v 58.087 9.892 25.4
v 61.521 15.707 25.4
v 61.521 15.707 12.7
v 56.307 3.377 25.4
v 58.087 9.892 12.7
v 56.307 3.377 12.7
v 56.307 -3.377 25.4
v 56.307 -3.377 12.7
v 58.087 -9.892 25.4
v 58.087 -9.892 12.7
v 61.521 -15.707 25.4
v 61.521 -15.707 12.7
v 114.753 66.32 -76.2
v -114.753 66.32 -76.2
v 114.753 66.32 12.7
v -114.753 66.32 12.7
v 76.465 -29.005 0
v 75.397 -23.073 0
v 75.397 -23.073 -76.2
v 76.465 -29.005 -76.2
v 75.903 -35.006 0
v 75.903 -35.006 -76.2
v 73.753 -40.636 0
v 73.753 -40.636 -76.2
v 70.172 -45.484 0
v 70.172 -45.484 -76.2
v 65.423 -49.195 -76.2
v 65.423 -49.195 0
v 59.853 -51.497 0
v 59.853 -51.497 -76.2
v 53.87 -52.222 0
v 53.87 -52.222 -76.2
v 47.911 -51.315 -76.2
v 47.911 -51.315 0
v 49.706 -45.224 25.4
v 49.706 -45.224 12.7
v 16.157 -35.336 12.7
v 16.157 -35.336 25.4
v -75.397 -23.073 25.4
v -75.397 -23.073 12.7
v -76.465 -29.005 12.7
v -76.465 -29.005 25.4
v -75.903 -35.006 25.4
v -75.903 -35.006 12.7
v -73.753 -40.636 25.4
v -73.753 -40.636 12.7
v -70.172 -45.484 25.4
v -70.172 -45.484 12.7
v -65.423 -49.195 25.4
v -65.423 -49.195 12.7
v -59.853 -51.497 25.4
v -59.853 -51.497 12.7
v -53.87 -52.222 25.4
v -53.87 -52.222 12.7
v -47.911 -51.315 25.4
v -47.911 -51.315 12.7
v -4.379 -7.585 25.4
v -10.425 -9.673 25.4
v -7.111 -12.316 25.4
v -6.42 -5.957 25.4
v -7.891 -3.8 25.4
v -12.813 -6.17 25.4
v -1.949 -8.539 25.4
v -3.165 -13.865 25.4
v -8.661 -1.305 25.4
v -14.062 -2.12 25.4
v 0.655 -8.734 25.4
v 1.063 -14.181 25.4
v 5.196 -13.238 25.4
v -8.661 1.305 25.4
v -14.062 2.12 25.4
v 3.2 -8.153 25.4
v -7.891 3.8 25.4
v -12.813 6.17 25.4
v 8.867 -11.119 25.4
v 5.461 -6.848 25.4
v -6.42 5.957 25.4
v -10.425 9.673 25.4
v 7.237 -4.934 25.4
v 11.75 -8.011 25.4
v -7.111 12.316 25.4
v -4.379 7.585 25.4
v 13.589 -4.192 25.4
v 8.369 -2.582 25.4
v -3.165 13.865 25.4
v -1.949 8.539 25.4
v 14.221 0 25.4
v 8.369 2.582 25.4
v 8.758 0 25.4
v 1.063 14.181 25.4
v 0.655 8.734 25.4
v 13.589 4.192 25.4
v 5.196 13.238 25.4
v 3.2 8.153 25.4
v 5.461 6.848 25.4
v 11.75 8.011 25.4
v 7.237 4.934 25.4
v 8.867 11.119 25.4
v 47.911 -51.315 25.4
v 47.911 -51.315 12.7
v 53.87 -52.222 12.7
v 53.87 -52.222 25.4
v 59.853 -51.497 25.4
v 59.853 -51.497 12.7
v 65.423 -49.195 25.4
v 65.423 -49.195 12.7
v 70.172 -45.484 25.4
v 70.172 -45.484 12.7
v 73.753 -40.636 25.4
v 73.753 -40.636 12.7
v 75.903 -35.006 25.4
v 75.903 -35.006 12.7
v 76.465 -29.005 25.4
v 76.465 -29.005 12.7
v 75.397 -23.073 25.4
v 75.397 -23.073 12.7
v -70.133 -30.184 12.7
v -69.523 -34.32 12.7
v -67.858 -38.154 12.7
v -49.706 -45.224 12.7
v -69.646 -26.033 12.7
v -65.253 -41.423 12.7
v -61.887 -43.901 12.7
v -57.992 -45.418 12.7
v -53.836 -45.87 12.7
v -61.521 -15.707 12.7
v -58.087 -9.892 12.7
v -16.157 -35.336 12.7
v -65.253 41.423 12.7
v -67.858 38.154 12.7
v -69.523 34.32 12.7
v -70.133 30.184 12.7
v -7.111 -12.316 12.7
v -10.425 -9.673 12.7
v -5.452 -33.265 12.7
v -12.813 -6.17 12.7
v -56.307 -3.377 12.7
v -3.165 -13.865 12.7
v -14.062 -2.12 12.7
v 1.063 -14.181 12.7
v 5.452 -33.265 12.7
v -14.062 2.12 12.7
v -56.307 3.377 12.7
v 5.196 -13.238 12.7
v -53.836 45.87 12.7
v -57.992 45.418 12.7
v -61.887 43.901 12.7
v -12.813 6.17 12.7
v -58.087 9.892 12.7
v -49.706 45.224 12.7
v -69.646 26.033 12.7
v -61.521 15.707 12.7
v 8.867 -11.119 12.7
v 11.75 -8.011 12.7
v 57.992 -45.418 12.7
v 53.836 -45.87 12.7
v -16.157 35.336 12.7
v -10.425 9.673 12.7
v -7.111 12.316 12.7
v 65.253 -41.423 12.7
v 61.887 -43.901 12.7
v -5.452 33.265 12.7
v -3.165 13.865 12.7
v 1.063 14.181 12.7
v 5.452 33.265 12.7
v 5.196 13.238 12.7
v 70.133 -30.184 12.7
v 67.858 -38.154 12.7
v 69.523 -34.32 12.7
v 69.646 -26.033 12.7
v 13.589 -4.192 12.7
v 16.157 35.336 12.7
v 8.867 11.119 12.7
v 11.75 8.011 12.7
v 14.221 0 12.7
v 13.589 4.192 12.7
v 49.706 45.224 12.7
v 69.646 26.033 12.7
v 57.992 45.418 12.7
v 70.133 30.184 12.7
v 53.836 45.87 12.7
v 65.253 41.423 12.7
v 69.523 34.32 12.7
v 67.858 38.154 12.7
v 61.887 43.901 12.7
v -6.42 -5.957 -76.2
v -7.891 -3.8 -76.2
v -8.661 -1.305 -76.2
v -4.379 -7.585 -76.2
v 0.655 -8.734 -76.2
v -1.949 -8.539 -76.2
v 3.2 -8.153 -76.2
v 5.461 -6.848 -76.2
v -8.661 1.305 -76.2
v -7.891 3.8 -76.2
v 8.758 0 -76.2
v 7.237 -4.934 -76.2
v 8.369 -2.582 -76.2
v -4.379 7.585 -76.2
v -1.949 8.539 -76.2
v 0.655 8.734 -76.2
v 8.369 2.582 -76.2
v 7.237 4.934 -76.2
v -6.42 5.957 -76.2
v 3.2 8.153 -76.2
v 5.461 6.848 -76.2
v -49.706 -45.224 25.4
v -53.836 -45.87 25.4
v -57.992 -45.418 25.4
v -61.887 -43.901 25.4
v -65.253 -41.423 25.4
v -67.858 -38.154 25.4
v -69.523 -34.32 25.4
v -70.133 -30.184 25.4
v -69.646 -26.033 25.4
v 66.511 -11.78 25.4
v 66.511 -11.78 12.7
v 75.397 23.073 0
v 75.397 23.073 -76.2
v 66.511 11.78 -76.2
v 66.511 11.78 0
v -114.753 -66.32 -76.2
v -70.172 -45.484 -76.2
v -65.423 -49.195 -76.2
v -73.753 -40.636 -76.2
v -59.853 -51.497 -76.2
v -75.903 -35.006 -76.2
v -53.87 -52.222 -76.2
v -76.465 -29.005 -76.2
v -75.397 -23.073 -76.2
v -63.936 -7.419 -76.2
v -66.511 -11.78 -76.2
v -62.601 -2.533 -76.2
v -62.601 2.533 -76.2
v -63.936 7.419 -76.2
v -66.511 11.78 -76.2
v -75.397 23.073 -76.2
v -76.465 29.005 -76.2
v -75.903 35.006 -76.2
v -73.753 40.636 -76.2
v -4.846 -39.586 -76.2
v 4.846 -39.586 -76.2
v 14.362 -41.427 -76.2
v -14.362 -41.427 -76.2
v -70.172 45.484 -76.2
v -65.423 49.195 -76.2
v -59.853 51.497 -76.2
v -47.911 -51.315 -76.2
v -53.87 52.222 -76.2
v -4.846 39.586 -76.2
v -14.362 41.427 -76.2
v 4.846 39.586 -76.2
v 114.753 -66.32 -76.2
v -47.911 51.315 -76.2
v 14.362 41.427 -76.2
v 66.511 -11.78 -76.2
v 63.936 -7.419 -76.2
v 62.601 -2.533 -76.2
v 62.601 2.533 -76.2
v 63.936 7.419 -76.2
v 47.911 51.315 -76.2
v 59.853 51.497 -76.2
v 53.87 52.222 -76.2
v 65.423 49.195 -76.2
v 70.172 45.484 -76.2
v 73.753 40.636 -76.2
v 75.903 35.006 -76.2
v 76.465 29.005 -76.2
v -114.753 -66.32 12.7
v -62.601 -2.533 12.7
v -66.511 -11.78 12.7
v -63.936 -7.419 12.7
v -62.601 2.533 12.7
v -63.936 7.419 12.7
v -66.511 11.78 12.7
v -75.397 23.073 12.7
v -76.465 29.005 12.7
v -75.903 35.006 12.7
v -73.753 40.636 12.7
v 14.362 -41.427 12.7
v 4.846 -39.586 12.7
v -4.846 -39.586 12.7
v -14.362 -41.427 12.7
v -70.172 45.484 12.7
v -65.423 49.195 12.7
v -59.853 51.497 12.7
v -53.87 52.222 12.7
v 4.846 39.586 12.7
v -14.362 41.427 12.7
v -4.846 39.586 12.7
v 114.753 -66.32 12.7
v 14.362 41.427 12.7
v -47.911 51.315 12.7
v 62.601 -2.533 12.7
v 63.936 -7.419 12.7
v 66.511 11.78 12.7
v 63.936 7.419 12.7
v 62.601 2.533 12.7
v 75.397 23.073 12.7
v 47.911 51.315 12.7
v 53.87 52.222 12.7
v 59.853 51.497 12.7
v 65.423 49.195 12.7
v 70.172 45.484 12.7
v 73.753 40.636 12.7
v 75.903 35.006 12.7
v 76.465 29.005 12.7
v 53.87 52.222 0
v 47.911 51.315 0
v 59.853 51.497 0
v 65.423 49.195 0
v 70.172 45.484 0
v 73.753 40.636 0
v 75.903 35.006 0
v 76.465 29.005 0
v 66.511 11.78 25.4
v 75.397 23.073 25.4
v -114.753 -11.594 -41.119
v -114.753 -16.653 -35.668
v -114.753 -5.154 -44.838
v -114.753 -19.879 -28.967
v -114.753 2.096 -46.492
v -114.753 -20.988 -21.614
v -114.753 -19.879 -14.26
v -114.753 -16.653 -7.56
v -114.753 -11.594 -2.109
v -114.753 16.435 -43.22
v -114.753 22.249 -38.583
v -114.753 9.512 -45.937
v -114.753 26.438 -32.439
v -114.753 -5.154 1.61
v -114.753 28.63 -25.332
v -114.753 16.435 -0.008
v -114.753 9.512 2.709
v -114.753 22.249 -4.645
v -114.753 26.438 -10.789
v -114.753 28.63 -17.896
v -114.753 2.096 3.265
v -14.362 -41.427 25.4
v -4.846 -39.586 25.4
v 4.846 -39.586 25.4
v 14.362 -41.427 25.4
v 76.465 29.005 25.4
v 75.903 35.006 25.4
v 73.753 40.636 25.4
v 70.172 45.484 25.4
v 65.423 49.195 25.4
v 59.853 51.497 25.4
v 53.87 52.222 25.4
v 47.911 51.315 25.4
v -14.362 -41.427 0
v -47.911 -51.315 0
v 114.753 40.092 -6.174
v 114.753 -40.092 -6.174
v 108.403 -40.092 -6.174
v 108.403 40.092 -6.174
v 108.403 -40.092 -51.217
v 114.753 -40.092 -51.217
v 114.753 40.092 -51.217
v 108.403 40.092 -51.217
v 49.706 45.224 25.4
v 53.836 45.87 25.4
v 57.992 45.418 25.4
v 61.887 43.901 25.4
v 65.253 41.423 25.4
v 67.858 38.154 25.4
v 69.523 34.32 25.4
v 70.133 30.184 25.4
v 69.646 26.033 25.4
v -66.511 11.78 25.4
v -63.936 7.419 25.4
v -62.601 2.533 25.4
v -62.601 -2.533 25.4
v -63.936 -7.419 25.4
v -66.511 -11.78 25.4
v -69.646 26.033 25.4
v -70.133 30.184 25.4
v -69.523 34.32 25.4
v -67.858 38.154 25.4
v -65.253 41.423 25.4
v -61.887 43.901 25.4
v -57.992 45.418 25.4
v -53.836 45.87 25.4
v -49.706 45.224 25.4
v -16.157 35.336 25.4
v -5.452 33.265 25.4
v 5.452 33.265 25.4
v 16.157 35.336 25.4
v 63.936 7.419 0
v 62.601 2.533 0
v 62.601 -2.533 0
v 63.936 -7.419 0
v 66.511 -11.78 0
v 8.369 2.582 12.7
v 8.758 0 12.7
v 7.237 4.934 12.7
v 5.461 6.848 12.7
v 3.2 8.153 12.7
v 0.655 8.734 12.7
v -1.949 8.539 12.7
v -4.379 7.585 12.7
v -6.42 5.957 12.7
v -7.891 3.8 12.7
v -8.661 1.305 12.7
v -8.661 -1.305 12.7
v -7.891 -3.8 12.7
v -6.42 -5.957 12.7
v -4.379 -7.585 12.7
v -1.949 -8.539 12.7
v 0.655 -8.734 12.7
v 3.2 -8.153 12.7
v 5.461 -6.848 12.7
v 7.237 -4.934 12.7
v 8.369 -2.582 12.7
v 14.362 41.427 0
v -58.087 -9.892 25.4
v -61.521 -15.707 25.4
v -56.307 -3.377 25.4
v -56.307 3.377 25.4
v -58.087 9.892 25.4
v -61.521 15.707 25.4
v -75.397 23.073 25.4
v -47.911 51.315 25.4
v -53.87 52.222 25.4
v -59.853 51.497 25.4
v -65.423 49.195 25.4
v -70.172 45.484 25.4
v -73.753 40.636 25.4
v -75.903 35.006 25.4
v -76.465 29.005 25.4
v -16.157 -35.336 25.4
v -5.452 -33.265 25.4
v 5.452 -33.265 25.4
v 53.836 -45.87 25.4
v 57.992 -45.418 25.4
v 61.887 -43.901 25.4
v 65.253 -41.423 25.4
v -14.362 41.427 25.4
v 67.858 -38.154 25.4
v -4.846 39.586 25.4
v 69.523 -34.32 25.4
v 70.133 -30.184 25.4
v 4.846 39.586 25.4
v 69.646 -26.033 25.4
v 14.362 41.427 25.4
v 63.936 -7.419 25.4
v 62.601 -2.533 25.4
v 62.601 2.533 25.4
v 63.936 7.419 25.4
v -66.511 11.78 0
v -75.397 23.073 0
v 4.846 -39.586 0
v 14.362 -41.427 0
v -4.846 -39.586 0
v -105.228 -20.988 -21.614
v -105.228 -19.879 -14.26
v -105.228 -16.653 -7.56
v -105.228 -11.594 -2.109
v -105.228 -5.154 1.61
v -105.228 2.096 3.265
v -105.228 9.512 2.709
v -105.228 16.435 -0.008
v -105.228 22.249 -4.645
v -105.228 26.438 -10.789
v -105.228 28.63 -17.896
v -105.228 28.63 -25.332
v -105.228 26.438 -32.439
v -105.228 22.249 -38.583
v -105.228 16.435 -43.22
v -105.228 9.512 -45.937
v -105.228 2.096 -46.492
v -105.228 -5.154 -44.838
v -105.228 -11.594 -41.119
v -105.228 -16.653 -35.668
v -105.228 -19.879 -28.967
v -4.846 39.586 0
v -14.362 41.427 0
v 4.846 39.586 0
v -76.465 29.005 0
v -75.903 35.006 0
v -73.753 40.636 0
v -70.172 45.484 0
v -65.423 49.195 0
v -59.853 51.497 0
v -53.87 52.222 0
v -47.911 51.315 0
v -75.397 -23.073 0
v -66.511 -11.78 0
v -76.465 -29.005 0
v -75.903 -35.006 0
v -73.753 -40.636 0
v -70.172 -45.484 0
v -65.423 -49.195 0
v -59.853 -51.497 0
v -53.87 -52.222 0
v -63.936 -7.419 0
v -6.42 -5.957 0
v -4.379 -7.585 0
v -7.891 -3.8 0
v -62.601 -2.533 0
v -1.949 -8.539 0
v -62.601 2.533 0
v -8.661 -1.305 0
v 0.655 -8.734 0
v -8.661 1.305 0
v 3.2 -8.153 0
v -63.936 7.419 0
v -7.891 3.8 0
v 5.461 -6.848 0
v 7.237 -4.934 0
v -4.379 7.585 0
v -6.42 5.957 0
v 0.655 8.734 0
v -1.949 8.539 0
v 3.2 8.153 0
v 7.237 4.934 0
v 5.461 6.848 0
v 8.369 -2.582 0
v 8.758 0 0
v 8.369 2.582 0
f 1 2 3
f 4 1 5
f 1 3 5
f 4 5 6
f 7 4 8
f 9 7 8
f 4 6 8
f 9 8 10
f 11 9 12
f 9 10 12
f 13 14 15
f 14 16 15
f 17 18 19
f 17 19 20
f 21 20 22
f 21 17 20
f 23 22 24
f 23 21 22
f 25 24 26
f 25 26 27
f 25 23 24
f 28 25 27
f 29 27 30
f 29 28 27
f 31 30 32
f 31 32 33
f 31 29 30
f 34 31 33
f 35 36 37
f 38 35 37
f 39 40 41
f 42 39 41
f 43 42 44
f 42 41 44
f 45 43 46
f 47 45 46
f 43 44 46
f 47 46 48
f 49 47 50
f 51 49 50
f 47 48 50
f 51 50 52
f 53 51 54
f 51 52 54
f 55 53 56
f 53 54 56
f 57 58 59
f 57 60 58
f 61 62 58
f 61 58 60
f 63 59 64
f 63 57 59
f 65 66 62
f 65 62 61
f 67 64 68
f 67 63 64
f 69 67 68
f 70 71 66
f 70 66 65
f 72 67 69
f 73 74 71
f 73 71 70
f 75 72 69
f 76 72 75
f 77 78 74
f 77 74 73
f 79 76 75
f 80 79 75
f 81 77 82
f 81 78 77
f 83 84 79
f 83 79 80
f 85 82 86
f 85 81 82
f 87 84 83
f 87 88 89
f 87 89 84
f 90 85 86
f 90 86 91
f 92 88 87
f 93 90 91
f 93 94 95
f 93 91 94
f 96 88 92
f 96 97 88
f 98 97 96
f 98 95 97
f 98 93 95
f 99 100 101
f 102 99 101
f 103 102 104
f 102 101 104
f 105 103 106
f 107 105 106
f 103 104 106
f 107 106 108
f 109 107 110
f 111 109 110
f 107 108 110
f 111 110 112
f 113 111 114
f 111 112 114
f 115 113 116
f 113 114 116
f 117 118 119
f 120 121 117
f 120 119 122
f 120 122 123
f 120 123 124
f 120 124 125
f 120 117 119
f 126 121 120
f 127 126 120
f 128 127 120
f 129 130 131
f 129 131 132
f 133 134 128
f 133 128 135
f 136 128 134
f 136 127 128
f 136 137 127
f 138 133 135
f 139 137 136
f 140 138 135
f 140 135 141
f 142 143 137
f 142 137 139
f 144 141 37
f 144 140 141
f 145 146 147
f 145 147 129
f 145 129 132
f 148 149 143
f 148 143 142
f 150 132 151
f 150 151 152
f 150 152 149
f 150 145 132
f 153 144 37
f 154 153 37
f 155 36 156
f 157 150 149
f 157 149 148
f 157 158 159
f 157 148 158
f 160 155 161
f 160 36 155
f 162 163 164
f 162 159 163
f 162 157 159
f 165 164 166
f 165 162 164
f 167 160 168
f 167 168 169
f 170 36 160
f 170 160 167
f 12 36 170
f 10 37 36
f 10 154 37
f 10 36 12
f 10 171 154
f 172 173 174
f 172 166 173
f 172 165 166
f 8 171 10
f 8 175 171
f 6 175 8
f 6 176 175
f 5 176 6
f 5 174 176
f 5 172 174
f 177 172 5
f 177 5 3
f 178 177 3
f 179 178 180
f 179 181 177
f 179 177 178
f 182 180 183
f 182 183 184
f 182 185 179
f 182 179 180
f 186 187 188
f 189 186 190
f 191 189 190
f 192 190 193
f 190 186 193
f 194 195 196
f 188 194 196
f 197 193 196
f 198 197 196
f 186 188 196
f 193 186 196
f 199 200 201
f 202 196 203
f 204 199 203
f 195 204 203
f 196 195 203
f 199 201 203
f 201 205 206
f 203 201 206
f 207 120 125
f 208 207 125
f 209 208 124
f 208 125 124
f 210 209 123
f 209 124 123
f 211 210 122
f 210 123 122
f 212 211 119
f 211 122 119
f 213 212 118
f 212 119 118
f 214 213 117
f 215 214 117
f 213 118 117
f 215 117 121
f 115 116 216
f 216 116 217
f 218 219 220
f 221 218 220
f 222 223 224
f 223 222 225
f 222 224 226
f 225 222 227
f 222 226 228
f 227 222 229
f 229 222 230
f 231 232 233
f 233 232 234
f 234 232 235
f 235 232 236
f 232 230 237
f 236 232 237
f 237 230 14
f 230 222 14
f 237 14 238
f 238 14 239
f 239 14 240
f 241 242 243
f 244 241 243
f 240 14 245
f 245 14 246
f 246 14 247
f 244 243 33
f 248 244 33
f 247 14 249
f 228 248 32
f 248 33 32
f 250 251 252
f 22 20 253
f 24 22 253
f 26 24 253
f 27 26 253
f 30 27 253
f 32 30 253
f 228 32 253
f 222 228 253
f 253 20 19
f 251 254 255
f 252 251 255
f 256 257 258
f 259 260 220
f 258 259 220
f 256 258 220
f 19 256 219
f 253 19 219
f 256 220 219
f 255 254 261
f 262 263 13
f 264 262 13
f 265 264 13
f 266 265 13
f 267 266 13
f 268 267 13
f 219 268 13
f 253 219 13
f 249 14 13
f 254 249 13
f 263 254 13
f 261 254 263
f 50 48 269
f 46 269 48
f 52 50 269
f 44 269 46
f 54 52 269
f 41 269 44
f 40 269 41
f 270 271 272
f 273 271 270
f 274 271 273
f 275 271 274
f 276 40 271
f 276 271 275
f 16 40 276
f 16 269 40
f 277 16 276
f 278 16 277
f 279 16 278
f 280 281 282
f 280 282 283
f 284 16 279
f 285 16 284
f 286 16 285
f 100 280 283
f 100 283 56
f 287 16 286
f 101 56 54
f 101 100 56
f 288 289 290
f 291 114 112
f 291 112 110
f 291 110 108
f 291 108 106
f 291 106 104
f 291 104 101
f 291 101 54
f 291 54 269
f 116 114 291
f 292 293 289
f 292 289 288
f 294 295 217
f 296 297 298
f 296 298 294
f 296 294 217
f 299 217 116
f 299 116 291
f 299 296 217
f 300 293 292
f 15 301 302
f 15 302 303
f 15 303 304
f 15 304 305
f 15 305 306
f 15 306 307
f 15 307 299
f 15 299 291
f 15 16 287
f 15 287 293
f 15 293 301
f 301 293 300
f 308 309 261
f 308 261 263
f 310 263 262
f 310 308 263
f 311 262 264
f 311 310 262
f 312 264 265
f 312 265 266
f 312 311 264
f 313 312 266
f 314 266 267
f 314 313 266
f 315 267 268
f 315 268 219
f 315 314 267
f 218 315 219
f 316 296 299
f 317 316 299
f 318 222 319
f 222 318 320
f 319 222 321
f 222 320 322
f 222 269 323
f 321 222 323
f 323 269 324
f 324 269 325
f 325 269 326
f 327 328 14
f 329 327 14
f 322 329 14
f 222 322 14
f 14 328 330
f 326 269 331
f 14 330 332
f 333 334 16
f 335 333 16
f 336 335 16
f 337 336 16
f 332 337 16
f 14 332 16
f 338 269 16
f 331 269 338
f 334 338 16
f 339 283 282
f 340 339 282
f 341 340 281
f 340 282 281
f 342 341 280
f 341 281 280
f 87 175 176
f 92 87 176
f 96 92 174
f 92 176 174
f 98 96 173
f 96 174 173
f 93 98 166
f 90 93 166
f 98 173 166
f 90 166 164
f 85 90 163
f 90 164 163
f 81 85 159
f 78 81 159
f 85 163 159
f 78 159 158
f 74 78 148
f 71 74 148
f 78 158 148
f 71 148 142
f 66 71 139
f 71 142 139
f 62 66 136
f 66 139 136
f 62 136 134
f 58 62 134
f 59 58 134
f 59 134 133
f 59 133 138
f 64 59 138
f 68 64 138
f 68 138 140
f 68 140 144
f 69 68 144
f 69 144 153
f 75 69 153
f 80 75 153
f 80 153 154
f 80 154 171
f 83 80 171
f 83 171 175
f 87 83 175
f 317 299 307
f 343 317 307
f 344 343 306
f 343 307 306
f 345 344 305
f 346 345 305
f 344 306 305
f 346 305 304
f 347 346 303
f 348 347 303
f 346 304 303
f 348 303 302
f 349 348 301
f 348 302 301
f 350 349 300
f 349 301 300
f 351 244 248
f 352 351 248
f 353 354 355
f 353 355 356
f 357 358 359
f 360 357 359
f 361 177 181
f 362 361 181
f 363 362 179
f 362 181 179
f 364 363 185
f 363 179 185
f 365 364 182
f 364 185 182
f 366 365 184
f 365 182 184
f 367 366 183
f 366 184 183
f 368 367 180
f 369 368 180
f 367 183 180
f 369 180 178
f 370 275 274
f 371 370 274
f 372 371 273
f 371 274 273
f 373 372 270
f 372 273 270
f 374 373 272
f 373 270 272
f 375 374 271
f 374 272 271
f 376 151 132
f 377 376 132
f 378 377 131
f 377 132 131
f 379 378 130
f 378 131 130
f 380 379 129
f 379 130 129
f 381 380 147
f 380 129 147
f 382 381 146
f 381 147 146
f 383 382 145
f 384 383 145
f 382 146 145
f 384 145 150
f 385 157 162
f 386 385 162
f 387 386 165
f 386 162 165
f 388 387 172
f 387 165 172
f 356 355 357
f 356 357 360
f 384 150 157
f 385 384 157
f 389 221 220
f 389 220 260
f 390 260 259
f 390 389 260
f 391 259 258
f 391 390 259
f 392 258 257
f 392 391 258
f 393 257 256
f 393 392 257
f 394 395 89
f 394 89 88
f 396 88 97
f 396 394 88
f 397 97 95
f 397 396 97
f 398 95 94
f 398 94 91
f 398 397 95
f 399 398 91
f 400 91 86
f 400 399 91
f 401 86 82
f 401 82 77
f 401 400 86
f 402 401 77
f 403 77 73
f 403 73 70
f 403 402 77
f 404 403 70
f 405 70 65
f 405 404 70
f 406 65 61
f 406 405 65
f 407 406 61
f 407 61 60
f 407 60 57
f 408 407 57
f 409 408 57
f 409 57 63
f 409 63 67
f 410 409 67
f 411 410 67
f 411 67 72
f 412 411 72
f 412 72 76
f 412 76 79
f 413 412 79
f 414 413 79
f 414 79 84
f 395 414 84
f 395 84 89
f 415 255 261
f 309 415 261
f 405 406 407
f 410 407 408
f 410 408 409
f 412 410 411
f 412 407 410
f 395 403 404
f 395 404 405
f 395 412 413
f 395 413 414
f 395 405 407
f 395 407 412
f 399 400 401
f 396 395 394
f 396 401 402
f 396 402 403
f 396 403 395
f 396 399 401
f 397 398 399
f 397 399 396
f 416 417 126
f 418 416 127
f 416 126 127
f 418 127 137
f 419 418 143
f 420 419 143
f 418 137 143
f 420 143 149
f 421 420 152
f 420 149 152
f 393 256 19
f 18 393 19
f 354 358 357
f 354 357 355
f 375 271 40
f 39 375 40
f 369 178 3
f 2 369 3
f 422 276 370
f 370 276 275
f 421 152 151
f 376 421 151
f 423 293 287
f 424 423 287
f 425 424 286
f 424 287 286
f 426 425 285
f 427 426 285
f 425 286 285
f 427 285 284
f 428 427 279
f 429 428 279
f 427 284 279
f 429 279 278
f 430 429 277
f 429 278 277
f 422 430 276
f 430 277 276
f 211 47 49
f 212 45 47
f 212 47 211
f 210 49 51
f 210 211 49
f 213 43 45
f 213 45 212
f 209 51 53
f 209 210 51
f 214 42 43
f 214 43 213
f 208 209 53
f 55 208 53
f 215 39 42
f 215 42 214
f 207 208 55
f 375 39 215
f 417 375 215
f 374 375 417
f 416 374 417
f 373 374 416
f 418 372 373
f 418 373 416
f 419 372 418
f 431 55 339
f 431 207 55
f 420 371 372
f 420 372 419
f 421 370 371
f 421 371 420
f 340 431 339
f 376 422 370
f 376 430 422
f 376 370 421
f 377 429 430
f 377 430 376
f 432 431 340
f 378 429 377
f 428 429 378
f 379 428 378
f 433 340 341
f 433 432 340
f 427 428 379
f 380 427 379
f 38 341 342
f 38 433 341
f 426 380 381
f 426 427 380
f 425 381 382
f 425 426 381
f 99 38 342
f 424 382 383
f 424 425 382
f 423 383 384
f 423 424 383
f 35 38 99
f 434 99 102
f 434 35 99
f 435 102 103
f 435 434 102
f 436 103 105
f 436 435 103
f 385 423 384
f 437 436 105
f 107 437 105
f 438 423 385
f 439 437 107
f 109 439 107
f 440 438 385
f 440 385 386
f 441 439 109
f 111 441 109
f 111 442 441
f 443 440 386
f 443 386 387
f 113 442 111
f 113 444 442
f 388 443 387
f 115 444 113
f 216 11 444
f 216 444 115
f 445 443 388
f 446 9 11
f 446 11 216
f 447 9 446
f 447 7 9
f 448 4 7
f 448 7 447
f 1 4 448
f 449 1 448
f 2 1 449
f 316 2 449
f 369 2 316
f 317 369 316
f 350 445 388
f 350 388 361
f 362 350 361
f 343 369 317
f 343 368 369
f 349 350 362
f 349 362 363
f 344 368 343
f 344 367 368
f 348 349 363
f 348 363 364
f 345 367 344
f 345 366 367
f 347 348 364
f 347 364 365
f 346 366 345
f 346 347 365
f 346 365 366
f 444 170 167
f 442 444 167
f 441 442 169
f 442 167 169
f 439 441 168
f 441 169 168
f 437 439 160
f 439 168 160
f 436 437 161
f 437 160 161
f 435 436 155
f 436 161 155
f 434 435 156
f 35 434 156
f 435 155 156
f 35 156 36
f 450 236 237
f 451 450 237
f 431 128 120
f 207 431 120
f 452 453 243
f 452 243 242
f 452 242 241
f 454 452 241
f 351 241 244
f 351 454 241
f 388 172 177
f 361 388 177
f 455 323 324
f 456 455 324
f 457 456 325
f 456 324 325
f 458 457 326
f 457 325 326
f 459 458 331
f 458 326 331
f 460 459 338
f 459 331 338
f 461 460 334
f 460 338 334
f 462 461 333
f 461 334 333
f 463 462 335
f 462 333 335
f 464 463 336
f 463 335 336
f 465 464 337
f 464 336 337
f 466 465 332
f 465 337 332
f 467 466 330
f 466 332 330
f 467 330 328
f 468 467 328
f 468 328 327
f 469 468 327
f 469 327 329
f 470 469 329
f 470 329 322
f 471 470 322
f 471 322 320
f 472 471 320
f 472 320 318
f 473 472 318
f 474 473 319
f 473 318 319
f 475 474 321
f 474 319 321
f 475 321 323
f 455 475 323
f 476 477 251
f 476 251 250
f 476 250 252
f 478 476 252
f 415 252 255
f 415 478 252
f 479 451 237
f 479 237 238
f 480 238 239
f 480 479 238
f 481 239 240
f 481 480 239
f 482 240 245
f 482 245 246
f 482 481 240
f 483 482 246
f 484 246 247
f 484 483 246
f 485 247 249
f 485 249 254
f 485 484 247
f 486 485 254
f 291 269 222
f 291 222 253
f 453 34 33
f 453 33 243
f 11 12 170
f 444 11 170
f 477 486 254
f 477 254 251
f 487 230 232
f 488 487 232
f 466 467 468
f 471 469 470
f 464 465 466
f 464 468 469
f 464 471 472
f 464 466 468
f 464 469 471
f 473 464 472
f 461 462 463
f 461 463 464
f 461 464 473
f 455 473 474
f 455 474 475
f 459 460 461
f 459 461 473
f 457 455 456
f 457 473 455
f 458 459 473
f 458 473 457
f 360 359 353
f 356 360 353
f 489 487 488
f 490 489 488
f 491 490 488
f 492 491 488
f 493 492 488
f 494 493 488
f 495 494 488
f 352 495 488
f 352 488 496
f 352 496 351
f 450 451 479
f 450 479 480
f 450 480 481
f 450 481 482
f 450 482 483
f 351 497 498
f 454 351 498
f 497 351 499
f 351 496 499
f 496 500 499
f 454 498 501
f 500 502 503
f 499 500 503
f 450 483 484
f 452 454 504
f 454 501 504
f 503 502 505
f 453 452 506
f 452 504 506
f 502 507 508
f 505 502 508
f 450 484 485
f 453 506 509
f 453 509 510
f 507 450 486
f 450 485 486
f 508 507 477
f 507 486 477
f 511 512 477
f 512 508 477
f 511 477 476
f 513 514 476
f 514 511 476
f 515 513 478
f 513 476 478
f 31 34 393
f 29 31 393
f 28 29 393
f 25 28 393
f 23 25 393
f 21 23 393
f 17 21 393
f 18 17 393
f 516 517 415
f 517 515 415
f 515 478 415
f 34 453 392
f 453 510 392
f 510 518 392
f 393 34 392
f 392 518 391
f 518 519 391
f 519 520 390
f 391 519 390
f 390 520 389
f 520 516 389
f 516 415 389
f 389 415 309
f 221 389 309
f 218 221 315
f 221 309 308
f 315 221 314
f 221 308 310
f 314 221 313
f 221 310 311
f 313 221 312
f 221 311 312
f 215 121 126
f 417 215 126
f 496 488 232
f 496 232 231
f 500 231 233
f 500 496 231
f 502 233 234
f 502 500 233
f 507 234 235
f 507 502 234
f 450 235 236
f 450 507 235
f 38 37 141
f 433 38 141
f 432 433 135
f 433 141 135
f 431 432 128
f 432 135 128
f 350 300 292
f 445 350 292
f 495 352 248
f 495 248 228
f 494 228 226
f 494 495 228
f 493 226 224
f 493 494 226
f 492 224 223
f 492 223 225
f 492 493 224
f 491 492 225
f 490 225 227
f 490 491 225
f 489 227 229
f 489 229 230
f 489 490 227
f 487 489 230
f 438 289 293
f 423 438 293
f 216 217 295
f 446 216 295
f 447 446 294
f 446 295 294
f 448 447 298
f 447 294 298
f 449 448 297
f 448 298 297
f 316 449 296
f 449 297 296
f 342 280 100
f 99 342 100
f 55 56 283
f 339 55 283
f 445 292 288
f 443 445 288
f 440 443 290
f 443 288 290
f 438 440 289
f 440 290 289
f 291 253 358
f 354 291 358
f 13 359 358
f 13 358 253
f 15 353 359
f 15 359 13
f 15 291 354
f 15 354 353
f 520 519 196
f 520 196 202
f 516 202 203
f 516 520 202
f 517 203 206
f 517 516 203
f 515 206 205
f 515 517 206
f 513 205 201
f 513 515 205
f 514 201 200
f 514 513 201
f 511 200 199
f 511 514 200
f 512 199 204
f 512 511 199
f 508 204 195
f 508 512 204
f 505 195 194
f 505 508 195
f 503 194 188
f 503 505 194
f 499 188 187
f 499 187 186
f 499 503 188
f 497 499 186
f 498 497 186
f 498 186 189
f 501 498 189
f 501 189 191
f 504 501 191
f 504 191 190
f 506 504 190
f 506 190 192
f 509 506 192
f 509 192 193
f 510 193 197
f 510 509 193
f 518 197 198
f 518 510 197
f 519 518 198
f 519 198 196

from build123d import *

# Parameters (mm, degrees)
F0_W          = 229.506806
F0_H          = 132.64066
F0_R          = 8.758442
F1_DEPTH      = 12.7
F1_DEPTH_BACK = 76.2
F0_R_2        = 14.221209
F2_DEPTH      = 12.7
F3_DEPTH      = 25.4
F4_DEPTH      = 12.7
F5_W          = 80.183886
F5_H          = 45.04325
F6_DEPTH      = 6.35
F7_R          = 24.948255
F8_DEPTH      = 9.525


with BuildPart() as f1:
    # F0 (on Top) → F1 (new body, two sides)
    with BuildSketch(Plane.XY) as f1_sk:
        Rectangle(F0_W, F0_H)
        with BuildLine():
            ThreePointArc((-66.51097, -11.780334), (-62.431816, 0), (-66.51097, 11.780334))
            Line((-66.51097, 11.780334), (-75.397, 23.073001))
            ThreePointArc((-75.397, 23.073001), (-70.17249, 45.484427), (-47.911137, 51.315352))
            Line((-47.911137, 51.315352), (-14.361814, 41.427133))
            ThreePointArc((-14.361814, 41.427133), (0, 39.354725), (14.361814, 41.427133))
            Line((14.361814, 41.427133), (47.911137, 51.315352))
            ThreePointArc((47.911137, 51.315352), (70.17249, 45.484427), (75.397, 23.073001))
            Line((75.397, 23.073001), (66.51097, 11.780334))
            ThreePointArc((66.51097, 11.780334), (62.431816, 0), (66.51097, -11.780334))
            Line((66.51097, -11.780334), (75.397, -23.073001))
            ThreePointArc((75.397, -23.073001), (70.17249, -45.484427), (47.911137, -51.315352))
            Line((47.911137, -51.315352), (14.361814, -41.427133))
            ThreePointArc((14.361814, -41.427133), (0, -39.354725), (-14.361814, -41.427133))
            Line((-14.361814, -41.427133), (-47.911137, -51.315352))
            ThreePointArc((-47.911137, -51.315352), (-70.17249, -45.484427), (-75.397, -23.073001))
            Line((-75.397, -23.073001), (-66.51097, -11.780334))
        make_face(mode=Mode.SUBTRACT)
        Circle(F0_R)
    extrude(amount=F1_DEPTH)
    extrude(f1_sk.sketch, amount=-F1_DEPTH_BACK)



with BuildPart() as f2:
    # F0 (on Top) → F2 (new body)
    with BuildSketch(Plane.XY):
        with BuildLine():
            ThreePointArc((69.645687, 26.032636), (65.252866, 41.422588), (49.706364, 45.224403))
            Line((49.706364, 45.224403), (16.157041, 35.336183))
            ThreePointArc((16.157041, 35.336183), (0, 33.004725), (-16.157041, 35.336183))
            Line((-16.157041, 35.336183), (-49.706364, 45.224403))
            ThreePointArc((-49.706364, 45.224403), (-65.252866, 41.422588), (-69.645687, 26.032636))
            Line((-69.645687, 26.032636), (-61.520688, 15.707112))
            ThreePointArc((-61.520688, 15.707112), (-56.081816, 0), (-61.520688, -15.707112))
            Line((-61.520688, -15.707112), (-69.645687, -26.032636))
            ThreePointArc((-69.645687, -26.032636), (-65.252866, -41.422588), (-49.706364, -45.224403))
            Line((-49.706364, -45.224403), (-16.157041, -35.336183))
            ThreePointArc((-16.157041, -35.336183), (0, -33.004725), (16.157041, -35.336183))
            Line((16.157041, -35.336183), (49.706364, -45.224403))
            ThreePointArc((49.706364, -45.224403), (65.252866, -41.422588), (69.645687, -26.032636))
            Line((69.645687, -26.032636), (61.520688, -15.707112))
            ThreePointArc((61.520688, -15.707112), (56.081816, 0), (61.520688, 15.707112))
            Line((61.520688, 15.707112), (69.645687, 26.032636))
        make_face()
        Circle(F0_R_2, mode=Mode.SUBTRACT)
    extrude(amount=F2_DEPTH)


with BuildPart() as f1_1:
    add(f1.part)

    add(f2.part)  # F3 merges F2
    # F0 (on Top) → F3 (join)
    with BuildSketch(Plane.XY):
        with BuildLine():
            Line((-75.397, 23.073001), (-66.51097, 11.780334))
            ThreePointArc((-66.51097, 11.780334), (-62.431816, 0), (-66.51097, -11.780334))
            Line((-66.51097, -11.780334), (-75.397, -23.073001))
            ThreePointArc((-75.397, -23.073001), (-70.17249, -45.484427), (-47.911137, -51.315352))
            Line((-47.911137, -51.315352), (-14.361814, -41.427133))
            ThreePointArc((-14.361814, -41.427133), (0, -39.354725), (14.361814, -41.427133))
            Line((14.361814, -41.427133), (47.911137, -51.315352))
            ThreePointArc((47.911137, -51.315352), (70.17249, -45.484427), (75.397, -23.073001))
            Line((75.397, -23.073001), (66.51097, -11.780334))
            ThreePointArc((66.51097, -11.780334), (62.431816, 0), (66.51097, 11.780334))
            Line((66.51097, 11.780334), (75.397, 23.073001))
            ThreePointArc((75.397, 23.073001), (70.17249, 45.484427), (47.911137, 51.315352))
            Line((47.911137, 51.315352), (14.361814, 41.427133))
            ThreePointArc((14.361814, 41.427133), (0, 39.354725), (-14.361814, 41.427133))
            Line((-14.361814, 41.427133), (-47.911137, 51.315352))
            ThreePointArc((-47.911137, 51.315352), (-70.17249, 45.484427), (-75.397, 23.073001))
        make_face()
        with BuildLine():
            Line((16.157041, 35.336183), (49.706364, 45.224403))
            ThreePointArc((49.706364, 45.224403), (65.252866, 41.422588), (69.645687, 26.032636))
            Line((69.645687, 26.032636), (61.520688, 15.707112))
            ThreePointArc((61.520688, 15.707112), (56.081816, 0), (61.520688, -15.707112))
            Line((61.520688, -15.707112), (69.645687, -26.032636))
            ThreePointArc((69.645687, -26.032636), (65.252866, -41.422588), (49.706364, -45.224403))
            Line((49.706364, -45.224403), (16.157041, -35.336183))
            ThreePointArc((16.157041, -35.336183), (0, -33.004725), (-16.157041, -35.336183))
            Line((-16.157041, -35.336183), (-49.706364, -45.224403))
            ThreePointArc((-49.706364, -45.224403), (-65.252866, -41.422588), (-69.645687, -26.032636))
            Line((-69.645687, -26.032636), (-61.520688, -15.707112))
            ThreePointArc((-61.520688, -15.707112), (-56.081816, 0), (-61.520688, 15.707112))
            Line((-61.520688, 15.707112), (-69.645687, 26.032636))
            ThreePointArc((-69.645687, 26.032636), (-65.252866, 41.422588), (-49.706364, 45.224403))
            Line((-49.706364, 45.224403), (-16.157041, 35.336183))
            ThreePointArc((-16.157041, 35.336183), (0, 33.004725), (16.157041, 35.336183))
        make_face(mode=Mode.SUBTRACT)
        Circle(F0_R_2)
        Circle(F0_R, mode=Mode.SUBTRACT)
    extrude(amount=F3_DEPTH)

    # F0 (on Top) → F4 (join)
    with BuildSketch(Plane.XY):
        with BuildLine():
            ThreePointArc((69.645687, 26.032636), (65.252866, 41.422588), (49.706364, 45.224403))
            Line((49.706364, 45.224403), (16.157041, 35.336183))
            ThreePointArc((16.157041, 35.336183), (0, 33.004725), (-16.157041, 35.336183))
            Line((-16.157041, 35.336183), (-49.706364, 45.224403))
            ThreePointArc((-49.706364, 45.224403), (-65.252866, 41.422588), (-69.645687, 26.032636))
            Line((-69.645687, 26.032636), (-61.520688, 15.707112))
            ThreePointArc((-61.520688, 15.707112), (-56.081816, 0), (-61.520688, -15.707112))
            Line((-61.520688, -15.707112), (-69.645687, -26.032636))
            ThreePointArc((-69.645687, -26.032636), (-65.252866, -41.422588), (-49.706364, -45.224403))
            Line((-49.706364, -45.224403), (-16.157041, -35.336183))
            ThreePointArc((-16.157041, -35.336183), (0, -33.004725), (16.157041, -35.336183))
            Line((16.157041, -35.336183), (49.706364, -45.224403))
            ThreePointArc((49.706364, -45.224403), (65.252866, -41.422588), (69.645687, -26.032636))
            Line((69.645687, -26.032636), (61.520688, -15.707112))
            ThreePointArc((61.520688, -15.707112), (56.081816, 0), (61.520688, 15.707112))
            Line((61.520688, 15.707112), (69.645687, 26.032636))
        make_face()
        Circle(F0_R_2, mode=Mode.SUBTRACT)
    extrude(amount=F4_DEPTH)

    # F5 (on face) → F6 (cut)
    with BuildSketch(Plane.YZ.offset(114.753403)):
        with Locations((0, -28.695723)):
            Rectangle(F5_W, F5_H)
    extrude(amount=-F6_DEPTH, mode=Mode.SUBTRACT)

    # F7 (on face) → F8 (cut)
    with BuildSketch(Plane(origin=(-114.753403, 0, 0), x_dir=(0, -1, 0), z_dir=(-1, 0, 0))):
        with Locations((-3.9606, -21.613867)):
            Circle(F7_R)
    extrude(amount=-F8_DEPTH, mode=Mode.SUBTRACT)


solid = f1_1.part
